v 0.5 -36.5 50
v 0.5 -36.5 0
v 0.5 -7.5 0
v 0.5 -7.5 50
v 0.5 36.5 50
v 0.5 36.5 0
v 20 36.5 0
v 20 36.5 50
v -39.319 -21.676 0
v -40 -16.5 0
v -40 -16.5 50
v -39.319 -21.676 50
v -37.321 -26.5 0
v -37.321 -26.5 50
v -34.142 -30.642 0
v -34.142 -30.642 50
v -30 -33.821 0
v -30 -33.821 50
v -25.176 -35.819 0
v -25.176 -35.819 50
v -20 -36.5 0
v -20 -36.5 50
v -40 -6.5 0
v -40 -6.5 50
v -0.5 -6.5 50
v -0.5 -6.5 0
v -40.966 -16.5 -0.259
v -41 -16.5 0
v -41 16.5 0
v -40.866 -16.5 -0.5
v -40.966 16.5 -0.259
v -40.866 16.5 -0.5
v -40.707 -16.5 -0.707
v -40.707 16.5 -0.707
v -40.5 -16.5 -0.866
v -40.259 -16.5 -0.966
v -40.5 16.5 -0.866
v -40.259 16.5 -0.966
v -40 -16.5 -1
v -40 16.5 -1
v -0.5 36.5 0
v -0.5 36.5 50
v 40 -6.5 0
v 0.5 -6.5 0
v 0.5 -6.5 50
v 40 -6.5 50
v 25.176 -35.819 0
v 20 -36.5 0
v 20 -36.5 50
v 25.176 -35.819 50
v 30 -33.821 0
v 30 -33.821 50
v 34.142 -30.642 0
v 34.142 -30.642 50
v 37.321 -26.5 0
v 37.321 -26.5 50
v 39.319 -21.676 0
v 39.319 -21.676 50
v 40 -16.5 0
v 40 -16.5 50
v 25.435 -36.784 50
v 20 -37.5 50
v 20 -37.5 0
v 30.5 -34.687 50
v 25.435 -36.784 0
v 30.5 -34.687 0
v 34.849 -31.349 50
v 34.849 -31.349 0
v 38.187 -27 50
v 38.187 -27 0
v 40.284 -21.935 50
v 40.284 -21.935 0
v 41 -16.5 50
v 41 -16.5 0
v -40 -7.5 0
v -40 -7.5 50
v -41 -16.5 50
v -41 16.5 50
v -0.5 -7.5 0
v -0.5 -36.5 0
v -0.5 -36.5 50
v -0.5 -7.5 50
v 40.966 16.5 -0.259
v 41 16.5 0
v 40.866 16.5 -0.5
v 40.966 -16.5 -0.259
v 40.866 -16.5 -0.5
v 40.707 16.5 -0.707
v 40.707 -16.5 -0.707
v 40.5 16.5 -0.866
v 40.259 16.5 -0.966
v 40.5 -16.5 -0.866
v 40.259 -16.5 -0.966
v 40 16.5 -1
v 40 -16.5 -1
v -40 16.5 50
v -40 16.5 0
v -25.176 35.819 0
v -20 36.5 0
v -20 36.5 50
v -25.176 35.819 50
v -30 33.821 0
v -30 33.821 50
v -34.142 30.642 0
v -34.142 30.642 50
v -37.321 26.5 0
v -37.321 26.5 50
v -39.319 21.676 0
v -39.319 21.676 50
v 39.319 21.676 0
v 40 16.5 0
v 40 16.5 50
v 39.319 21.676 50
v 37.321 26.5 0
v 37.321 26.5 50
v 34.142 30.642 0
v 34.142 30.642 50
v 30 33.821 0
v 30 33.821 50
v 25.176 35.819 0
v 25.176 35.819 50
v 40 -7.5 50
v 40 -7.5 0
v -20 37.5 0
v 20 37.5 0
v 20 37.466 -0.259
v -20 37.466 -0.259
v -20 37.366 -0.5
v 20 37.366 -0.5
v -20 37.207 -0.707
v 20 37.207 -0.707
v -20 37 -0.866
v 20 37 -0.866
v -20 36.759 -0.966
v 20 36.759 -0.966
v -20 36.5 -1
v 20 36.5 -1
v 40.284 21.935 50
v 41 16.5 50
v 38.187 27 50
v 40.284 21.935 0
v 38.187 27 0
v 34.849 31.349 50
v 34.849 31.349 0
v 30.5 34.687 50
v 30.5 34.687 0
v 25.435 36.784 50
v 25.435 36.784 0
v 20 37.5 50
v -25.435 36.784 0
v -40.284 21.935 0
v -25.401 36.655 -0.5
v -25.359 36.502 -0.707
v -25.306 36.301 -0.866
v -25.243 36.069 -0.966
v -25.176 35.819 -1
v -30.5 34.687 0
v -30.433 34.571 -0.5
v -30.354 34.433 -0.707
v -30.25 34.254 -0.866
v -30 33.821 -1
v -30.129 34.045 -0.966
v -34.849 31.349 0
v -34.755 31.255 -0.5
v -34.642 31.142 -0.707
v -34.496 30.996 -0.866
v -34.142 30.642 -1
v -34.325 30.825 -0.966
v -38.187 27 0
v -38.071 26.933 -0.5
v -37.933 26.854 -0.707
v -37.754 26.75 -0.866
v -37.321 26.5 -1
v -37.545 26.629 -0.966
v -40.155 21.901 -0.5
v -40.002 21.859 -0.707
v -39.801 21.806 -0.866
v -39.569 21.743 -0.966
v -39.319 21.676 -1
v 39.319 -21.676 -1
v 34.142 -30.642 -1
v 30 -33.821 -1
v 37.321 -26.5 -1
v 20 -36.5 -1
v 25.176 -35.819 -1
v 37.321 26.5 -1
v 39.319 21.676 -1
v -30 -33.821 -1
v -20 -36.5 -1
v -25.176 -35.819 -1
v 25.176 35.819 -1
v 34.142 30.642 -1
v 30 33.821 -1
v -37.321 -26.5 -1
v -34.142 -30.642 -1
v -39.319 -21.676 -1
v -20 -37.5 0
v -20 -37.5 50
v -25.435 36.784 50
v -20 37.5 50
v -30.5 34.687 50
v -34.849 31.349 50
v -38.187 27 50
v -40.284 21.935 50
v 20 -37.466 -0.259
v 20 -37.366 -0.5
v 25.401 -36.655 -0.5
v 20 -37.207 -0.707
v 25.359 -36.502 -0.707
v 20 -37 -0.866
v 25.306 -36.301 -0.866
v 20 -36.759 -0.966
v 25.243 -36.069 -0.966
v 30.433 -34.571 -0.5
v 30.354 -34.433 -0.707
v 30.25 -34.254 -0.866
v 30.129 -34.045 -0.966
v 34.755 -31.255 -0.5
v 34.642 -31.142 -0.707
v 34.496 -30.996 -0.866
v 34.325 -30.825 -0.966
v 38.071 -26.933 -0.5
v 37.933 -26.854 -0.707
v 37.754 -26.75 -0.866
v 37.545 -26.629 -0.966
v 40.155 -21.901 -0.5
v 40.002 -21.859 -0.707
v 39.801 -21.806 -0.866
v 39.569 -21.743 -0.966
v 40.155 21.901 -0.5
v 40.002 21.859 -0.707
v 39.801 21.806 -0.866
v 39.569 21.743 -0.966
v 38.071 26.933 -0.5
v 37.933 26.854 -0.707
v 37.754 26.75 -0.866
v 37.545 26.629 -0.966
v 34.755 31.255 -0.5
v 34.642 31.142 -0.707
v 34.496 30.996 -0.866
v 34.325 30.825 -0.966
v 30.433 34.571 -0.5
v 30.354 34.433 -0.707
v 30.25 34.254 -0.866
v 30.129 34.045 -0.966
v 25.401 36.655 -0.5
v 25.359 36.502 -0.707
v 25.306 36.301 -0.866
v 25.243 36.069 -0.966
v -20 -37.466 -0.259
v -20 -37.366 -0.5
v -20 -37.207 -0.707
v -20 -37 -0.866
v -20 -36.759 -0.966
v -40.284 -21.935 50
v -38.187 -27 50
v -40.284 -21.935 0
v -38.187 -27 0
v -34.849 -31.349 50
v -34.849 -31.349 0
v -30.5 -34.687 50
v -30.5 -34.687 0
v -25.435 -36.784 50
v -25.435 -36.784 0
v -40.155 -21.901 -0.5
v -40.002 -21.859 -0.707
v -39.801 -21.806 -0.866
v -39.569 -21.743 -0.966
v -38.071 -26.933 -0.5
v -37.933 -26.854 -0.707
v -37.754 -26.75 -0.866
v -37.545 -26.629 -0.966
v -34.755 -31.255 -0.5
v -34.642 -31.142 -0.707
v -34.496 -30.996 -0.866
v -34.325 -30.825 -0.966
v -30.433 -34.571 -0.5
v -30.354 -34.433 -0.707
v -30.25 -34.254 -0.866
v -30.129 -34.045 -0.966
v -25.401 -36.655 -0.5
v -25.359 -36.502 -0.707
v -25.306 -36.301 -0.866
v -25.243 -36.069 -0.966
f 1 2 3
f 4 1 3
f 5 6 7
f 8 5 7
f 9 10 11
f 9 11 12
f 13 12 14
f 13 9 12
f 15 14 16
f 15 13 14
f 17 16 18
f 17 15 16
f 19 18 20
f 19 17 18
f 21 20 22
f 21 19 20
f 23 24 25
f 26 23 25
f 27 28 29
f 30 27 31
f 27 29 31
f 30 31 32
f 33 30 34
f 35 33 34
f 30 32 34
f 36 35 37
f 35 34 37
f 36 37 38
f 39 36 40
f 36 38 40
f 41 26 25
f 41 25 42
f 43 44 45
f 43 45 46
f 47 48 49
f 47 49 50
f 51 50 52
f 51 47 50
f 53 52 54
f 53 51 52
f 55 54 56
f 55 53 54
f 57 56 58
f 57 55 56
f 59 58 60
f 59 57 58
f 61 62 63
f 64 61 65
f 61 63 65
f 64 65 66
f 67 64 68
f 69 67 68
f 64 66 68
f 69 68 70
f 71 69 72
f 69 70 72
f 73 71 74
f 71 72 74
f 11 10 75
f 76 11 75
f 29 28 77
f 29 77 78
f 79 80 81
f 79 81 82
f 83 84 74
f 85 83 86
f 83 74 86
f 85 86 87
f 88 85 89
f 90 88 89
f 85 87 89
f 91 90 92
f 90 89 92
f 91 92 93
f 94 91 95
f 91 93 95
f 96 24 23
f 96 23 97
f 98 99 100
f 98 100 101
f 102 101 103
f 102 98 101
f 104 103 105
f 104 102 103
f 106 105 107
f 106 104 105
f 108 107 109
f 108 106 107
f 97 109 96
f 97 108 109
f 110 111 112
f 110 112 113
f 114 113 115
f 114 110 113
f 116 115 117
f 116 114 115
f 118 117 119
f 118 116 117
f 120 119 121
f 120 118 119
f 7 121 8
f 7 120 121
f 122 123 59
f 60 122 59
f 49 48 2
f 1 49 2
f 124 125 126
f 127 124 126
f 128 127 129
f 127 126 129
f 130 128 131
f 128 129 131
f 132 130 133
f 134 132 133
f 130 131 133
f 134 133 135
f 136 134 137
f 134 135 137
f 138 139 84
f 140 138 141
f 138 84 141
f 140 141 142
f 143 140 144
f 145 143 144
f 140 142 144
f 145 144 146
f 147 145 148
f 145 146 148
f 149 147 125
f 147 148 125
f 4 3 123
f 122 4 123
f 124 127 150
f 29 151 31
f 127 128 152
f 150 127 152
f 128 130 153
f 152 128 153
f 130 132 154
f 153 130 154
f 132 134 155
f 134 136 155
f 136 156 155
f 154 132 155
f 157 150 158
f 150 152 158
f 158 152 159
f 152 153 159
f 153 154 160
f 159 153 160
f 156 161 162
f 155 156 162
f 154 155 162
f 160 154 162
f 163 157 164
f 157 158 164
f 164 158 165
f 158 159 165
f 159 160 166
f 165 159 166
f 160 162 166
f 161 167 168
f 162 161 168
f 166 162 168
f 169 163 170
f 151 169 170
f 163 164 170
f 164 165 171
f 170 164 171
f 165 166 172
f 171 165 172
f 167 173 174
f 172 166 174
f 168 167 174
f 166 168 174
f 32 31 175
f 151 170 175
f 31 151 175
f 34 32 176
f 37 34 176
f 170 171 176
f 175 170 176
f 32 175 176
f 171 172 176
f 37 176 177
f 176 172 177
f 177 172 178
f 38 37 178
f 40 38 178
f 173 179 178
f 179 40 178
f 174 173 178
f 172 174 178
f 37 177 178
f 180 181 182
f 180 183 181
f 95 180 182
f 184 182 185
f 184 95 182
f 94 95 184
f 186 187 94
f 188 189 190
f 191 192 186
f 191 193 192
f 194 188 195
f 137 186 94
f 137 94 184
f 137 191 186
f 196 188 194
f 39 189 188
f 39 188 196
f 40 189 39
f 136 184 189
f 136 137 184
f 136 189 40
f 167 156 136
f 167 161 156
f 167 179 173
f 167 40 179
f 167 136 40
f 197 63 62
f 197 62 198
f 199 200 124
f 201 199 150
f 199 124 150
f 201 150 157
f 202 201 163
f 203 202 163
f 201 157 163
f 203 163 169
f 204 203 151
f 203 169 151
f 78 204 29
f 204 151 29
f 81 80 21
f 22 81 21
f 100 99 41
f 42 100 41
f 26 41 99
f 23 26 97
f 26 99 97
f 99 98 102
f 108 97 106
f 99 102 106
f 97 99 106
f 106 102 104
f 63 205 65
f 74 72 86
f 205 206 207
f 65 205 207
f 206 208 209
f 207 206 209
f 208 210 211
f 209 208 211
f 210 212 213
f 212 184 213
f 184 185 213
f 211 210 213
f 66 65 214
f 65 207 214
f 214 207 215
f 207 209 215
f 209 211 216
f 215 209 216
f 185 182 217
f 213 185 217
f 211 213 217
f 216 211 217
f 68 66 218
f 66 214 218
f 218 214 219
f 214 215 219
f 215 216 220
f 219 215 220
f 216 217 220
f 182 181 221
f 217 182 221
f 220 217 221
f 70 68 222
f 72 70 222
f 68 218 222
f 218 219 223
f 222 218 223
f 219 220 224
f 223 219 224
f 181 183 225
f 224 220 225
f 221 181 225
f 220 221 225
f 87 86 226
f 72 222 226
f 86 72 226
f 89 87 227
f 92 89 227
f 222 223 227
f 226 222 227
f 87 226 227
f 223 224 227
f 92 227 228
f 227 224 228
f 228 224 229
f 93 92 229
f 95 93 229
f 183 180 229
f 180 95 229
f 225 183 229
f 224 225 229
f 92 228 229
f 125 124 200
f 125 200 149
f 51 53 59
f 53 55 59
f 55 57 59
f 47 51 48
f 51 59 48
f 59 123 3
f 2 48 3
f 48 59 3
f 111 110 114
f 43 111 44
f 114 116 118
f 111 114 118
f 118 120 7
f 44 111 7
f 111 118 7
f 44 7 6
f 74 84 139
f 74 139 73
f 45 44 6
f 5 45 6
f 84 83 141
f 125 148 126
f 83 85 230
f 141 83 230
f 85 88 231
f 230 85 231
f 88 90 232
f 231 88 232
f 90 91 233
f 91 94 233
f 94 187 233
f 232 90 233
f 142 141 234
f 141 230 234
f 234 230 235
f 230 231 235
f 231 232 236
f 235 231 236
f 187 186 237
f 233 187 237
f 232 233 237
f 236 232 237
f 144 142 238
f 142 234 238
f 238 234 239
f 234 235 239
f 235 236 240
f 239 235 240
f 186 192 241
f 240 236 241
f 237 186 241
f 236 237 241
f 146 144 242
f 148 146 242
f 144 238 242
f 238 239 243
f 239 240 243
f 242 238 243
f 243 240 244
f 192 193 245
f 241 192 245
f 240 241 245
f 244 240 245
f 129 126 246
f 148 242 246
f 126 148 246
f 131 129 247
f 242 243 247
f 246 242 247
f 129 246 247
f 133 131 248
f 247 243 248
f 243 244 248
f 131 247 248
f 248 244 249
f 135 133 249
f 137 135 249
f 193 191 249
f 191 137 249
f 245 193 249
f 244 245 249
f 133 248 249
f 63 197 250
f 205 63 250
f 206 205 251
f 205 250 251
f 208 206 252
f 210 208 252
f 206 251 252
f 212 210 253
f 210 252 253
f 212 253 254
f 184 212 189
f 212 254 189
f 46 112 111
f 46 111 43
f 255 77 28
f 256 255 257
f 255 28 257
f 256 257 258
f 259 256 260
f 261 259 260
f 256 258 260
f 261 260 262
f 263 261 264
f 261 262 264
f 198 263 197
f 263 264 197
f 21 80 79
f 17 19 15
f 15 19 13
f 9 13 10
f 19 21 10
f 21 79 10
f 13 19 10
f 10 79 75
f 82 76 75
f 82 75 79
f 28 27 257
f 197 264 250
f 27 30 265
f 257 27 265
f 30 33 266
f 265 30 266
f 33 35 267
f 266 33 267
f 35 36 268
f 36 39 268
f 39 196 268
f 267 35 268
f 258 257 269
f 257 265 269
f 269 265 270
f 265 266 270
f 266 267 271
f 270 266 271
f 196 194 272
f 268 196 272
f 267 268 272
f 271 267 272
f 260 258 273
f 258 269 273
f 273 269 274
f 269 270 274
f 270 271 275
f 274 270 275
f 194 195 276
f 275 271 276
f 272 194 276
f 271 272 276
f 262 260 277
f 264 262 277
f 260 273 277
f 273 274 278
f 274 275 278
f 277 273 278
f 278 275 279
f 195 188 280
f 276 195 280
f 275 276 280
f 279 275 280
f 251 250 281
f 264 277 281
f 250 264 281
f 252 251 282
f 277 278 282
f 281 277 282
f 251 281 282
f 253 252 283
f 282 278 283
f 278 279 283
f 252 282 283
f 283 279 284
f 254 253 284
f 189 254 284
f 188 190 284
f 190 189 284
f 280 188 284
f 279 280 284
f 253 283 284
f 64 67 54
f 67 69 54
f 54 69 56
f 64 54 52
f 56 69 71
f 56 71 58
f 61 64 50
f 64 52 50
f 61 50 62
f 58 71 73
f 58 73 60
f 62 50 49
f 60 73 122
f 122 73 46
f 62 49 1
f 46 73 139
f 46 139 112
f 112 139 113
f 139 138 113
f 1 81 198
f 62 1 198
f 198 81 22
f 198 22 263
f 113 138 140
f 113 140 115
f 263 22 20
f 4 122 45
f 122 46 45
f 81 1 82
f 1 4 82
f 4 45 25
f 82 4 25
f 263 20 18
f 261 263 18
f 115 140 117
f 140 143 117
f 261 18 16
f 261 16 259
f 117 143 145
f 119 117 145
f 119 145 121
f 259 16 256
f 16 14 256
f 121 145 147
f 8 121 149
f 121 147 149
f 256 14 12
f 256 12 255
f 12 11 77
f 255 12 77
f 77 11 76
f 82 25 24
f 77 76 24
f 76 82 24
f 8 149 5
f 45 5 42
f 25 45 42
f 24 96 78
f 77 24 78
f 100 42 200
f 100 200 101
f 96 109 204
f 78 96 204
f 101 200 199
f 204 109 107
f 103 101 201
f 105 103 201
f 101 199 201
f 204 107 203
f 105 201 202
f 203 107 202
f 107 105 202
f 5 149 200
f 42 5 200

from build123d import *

# Parameters (mm, degrees)
PAD_DEPTH    = 50
THICKNESS_T  = 1
SKETCH001_W  = 80
SKETCH001_H  = 1
PAD001_DEPTH = 50
SKETCH002_W  = 1
SKETCH002_H  = 29
PAD002_DEPTH = 50
SKETCH003_W  = 1
SKETCH003_H  = 43
PAD003_DEPTH = 50


with BuildPart() as part:
    # Sketch → Pad (new body)
    with BuildSketch(Plane.XY):
        with BuildLine():
            Line((-20, 36.5), (20, 36.5))
            ThreePointArc((40, 16.5), (34.142136, 30.642136), (20, 36.5))
            Line((40, 16.5), (40, -16.5))
            ThreePointArc((20, -36.5), (34.142136, -30.642136), (40, -16.5))
            Line((20, -36.5), (-20, -36.5))
            ThreePointArc((-40, -16.5), (-34.142136, -30.642136), (-20, -36.5))
            Line((-40, -16.5), (-40, 16.5))
            ThreePointArc((-20, 36.5), (-34.142136, 30.642136), (-40, 16.5))
        make_face()
    extrude(amount=PAD_DEPTH)

    # Thickness
    thickness_openings = [part.faces().sort_by_distance(p)[0] for p in [
        (0, 0, 50),
    ]]
    offset(amount=THICKNESS_T, openings=thickness_openings)

    # Sketch001 (on Face9 of Thickness) → Pad001 (join)
    with BuildSketch(Plane.XY):
        with Locations((0, -7)):
            Rectangle(SKETCH001_W, SKETCH001_H)
    extrude(amount=PAD001_DEPTH)

    # Sketch002 (on Face24 of Pad001) → Pad002 (join)
    with BuildSketch(Plane.XY):
        with Locations((0, -22)):
            Rectangle(SKETCH002_W, SKETCH002_H)
    extrude(amount=PAD002_DEPTH)

    # Sketch003 (on Face4 of Pad002) → Pad003 (join)
    with BuildSketch(Plane.XY):
        with Locations((0, 15)):
            Rectangle(SKETCH003_W, SKETCH003_H)
    extrude(amount=PAD003_DEPTH)


solid = part.part
